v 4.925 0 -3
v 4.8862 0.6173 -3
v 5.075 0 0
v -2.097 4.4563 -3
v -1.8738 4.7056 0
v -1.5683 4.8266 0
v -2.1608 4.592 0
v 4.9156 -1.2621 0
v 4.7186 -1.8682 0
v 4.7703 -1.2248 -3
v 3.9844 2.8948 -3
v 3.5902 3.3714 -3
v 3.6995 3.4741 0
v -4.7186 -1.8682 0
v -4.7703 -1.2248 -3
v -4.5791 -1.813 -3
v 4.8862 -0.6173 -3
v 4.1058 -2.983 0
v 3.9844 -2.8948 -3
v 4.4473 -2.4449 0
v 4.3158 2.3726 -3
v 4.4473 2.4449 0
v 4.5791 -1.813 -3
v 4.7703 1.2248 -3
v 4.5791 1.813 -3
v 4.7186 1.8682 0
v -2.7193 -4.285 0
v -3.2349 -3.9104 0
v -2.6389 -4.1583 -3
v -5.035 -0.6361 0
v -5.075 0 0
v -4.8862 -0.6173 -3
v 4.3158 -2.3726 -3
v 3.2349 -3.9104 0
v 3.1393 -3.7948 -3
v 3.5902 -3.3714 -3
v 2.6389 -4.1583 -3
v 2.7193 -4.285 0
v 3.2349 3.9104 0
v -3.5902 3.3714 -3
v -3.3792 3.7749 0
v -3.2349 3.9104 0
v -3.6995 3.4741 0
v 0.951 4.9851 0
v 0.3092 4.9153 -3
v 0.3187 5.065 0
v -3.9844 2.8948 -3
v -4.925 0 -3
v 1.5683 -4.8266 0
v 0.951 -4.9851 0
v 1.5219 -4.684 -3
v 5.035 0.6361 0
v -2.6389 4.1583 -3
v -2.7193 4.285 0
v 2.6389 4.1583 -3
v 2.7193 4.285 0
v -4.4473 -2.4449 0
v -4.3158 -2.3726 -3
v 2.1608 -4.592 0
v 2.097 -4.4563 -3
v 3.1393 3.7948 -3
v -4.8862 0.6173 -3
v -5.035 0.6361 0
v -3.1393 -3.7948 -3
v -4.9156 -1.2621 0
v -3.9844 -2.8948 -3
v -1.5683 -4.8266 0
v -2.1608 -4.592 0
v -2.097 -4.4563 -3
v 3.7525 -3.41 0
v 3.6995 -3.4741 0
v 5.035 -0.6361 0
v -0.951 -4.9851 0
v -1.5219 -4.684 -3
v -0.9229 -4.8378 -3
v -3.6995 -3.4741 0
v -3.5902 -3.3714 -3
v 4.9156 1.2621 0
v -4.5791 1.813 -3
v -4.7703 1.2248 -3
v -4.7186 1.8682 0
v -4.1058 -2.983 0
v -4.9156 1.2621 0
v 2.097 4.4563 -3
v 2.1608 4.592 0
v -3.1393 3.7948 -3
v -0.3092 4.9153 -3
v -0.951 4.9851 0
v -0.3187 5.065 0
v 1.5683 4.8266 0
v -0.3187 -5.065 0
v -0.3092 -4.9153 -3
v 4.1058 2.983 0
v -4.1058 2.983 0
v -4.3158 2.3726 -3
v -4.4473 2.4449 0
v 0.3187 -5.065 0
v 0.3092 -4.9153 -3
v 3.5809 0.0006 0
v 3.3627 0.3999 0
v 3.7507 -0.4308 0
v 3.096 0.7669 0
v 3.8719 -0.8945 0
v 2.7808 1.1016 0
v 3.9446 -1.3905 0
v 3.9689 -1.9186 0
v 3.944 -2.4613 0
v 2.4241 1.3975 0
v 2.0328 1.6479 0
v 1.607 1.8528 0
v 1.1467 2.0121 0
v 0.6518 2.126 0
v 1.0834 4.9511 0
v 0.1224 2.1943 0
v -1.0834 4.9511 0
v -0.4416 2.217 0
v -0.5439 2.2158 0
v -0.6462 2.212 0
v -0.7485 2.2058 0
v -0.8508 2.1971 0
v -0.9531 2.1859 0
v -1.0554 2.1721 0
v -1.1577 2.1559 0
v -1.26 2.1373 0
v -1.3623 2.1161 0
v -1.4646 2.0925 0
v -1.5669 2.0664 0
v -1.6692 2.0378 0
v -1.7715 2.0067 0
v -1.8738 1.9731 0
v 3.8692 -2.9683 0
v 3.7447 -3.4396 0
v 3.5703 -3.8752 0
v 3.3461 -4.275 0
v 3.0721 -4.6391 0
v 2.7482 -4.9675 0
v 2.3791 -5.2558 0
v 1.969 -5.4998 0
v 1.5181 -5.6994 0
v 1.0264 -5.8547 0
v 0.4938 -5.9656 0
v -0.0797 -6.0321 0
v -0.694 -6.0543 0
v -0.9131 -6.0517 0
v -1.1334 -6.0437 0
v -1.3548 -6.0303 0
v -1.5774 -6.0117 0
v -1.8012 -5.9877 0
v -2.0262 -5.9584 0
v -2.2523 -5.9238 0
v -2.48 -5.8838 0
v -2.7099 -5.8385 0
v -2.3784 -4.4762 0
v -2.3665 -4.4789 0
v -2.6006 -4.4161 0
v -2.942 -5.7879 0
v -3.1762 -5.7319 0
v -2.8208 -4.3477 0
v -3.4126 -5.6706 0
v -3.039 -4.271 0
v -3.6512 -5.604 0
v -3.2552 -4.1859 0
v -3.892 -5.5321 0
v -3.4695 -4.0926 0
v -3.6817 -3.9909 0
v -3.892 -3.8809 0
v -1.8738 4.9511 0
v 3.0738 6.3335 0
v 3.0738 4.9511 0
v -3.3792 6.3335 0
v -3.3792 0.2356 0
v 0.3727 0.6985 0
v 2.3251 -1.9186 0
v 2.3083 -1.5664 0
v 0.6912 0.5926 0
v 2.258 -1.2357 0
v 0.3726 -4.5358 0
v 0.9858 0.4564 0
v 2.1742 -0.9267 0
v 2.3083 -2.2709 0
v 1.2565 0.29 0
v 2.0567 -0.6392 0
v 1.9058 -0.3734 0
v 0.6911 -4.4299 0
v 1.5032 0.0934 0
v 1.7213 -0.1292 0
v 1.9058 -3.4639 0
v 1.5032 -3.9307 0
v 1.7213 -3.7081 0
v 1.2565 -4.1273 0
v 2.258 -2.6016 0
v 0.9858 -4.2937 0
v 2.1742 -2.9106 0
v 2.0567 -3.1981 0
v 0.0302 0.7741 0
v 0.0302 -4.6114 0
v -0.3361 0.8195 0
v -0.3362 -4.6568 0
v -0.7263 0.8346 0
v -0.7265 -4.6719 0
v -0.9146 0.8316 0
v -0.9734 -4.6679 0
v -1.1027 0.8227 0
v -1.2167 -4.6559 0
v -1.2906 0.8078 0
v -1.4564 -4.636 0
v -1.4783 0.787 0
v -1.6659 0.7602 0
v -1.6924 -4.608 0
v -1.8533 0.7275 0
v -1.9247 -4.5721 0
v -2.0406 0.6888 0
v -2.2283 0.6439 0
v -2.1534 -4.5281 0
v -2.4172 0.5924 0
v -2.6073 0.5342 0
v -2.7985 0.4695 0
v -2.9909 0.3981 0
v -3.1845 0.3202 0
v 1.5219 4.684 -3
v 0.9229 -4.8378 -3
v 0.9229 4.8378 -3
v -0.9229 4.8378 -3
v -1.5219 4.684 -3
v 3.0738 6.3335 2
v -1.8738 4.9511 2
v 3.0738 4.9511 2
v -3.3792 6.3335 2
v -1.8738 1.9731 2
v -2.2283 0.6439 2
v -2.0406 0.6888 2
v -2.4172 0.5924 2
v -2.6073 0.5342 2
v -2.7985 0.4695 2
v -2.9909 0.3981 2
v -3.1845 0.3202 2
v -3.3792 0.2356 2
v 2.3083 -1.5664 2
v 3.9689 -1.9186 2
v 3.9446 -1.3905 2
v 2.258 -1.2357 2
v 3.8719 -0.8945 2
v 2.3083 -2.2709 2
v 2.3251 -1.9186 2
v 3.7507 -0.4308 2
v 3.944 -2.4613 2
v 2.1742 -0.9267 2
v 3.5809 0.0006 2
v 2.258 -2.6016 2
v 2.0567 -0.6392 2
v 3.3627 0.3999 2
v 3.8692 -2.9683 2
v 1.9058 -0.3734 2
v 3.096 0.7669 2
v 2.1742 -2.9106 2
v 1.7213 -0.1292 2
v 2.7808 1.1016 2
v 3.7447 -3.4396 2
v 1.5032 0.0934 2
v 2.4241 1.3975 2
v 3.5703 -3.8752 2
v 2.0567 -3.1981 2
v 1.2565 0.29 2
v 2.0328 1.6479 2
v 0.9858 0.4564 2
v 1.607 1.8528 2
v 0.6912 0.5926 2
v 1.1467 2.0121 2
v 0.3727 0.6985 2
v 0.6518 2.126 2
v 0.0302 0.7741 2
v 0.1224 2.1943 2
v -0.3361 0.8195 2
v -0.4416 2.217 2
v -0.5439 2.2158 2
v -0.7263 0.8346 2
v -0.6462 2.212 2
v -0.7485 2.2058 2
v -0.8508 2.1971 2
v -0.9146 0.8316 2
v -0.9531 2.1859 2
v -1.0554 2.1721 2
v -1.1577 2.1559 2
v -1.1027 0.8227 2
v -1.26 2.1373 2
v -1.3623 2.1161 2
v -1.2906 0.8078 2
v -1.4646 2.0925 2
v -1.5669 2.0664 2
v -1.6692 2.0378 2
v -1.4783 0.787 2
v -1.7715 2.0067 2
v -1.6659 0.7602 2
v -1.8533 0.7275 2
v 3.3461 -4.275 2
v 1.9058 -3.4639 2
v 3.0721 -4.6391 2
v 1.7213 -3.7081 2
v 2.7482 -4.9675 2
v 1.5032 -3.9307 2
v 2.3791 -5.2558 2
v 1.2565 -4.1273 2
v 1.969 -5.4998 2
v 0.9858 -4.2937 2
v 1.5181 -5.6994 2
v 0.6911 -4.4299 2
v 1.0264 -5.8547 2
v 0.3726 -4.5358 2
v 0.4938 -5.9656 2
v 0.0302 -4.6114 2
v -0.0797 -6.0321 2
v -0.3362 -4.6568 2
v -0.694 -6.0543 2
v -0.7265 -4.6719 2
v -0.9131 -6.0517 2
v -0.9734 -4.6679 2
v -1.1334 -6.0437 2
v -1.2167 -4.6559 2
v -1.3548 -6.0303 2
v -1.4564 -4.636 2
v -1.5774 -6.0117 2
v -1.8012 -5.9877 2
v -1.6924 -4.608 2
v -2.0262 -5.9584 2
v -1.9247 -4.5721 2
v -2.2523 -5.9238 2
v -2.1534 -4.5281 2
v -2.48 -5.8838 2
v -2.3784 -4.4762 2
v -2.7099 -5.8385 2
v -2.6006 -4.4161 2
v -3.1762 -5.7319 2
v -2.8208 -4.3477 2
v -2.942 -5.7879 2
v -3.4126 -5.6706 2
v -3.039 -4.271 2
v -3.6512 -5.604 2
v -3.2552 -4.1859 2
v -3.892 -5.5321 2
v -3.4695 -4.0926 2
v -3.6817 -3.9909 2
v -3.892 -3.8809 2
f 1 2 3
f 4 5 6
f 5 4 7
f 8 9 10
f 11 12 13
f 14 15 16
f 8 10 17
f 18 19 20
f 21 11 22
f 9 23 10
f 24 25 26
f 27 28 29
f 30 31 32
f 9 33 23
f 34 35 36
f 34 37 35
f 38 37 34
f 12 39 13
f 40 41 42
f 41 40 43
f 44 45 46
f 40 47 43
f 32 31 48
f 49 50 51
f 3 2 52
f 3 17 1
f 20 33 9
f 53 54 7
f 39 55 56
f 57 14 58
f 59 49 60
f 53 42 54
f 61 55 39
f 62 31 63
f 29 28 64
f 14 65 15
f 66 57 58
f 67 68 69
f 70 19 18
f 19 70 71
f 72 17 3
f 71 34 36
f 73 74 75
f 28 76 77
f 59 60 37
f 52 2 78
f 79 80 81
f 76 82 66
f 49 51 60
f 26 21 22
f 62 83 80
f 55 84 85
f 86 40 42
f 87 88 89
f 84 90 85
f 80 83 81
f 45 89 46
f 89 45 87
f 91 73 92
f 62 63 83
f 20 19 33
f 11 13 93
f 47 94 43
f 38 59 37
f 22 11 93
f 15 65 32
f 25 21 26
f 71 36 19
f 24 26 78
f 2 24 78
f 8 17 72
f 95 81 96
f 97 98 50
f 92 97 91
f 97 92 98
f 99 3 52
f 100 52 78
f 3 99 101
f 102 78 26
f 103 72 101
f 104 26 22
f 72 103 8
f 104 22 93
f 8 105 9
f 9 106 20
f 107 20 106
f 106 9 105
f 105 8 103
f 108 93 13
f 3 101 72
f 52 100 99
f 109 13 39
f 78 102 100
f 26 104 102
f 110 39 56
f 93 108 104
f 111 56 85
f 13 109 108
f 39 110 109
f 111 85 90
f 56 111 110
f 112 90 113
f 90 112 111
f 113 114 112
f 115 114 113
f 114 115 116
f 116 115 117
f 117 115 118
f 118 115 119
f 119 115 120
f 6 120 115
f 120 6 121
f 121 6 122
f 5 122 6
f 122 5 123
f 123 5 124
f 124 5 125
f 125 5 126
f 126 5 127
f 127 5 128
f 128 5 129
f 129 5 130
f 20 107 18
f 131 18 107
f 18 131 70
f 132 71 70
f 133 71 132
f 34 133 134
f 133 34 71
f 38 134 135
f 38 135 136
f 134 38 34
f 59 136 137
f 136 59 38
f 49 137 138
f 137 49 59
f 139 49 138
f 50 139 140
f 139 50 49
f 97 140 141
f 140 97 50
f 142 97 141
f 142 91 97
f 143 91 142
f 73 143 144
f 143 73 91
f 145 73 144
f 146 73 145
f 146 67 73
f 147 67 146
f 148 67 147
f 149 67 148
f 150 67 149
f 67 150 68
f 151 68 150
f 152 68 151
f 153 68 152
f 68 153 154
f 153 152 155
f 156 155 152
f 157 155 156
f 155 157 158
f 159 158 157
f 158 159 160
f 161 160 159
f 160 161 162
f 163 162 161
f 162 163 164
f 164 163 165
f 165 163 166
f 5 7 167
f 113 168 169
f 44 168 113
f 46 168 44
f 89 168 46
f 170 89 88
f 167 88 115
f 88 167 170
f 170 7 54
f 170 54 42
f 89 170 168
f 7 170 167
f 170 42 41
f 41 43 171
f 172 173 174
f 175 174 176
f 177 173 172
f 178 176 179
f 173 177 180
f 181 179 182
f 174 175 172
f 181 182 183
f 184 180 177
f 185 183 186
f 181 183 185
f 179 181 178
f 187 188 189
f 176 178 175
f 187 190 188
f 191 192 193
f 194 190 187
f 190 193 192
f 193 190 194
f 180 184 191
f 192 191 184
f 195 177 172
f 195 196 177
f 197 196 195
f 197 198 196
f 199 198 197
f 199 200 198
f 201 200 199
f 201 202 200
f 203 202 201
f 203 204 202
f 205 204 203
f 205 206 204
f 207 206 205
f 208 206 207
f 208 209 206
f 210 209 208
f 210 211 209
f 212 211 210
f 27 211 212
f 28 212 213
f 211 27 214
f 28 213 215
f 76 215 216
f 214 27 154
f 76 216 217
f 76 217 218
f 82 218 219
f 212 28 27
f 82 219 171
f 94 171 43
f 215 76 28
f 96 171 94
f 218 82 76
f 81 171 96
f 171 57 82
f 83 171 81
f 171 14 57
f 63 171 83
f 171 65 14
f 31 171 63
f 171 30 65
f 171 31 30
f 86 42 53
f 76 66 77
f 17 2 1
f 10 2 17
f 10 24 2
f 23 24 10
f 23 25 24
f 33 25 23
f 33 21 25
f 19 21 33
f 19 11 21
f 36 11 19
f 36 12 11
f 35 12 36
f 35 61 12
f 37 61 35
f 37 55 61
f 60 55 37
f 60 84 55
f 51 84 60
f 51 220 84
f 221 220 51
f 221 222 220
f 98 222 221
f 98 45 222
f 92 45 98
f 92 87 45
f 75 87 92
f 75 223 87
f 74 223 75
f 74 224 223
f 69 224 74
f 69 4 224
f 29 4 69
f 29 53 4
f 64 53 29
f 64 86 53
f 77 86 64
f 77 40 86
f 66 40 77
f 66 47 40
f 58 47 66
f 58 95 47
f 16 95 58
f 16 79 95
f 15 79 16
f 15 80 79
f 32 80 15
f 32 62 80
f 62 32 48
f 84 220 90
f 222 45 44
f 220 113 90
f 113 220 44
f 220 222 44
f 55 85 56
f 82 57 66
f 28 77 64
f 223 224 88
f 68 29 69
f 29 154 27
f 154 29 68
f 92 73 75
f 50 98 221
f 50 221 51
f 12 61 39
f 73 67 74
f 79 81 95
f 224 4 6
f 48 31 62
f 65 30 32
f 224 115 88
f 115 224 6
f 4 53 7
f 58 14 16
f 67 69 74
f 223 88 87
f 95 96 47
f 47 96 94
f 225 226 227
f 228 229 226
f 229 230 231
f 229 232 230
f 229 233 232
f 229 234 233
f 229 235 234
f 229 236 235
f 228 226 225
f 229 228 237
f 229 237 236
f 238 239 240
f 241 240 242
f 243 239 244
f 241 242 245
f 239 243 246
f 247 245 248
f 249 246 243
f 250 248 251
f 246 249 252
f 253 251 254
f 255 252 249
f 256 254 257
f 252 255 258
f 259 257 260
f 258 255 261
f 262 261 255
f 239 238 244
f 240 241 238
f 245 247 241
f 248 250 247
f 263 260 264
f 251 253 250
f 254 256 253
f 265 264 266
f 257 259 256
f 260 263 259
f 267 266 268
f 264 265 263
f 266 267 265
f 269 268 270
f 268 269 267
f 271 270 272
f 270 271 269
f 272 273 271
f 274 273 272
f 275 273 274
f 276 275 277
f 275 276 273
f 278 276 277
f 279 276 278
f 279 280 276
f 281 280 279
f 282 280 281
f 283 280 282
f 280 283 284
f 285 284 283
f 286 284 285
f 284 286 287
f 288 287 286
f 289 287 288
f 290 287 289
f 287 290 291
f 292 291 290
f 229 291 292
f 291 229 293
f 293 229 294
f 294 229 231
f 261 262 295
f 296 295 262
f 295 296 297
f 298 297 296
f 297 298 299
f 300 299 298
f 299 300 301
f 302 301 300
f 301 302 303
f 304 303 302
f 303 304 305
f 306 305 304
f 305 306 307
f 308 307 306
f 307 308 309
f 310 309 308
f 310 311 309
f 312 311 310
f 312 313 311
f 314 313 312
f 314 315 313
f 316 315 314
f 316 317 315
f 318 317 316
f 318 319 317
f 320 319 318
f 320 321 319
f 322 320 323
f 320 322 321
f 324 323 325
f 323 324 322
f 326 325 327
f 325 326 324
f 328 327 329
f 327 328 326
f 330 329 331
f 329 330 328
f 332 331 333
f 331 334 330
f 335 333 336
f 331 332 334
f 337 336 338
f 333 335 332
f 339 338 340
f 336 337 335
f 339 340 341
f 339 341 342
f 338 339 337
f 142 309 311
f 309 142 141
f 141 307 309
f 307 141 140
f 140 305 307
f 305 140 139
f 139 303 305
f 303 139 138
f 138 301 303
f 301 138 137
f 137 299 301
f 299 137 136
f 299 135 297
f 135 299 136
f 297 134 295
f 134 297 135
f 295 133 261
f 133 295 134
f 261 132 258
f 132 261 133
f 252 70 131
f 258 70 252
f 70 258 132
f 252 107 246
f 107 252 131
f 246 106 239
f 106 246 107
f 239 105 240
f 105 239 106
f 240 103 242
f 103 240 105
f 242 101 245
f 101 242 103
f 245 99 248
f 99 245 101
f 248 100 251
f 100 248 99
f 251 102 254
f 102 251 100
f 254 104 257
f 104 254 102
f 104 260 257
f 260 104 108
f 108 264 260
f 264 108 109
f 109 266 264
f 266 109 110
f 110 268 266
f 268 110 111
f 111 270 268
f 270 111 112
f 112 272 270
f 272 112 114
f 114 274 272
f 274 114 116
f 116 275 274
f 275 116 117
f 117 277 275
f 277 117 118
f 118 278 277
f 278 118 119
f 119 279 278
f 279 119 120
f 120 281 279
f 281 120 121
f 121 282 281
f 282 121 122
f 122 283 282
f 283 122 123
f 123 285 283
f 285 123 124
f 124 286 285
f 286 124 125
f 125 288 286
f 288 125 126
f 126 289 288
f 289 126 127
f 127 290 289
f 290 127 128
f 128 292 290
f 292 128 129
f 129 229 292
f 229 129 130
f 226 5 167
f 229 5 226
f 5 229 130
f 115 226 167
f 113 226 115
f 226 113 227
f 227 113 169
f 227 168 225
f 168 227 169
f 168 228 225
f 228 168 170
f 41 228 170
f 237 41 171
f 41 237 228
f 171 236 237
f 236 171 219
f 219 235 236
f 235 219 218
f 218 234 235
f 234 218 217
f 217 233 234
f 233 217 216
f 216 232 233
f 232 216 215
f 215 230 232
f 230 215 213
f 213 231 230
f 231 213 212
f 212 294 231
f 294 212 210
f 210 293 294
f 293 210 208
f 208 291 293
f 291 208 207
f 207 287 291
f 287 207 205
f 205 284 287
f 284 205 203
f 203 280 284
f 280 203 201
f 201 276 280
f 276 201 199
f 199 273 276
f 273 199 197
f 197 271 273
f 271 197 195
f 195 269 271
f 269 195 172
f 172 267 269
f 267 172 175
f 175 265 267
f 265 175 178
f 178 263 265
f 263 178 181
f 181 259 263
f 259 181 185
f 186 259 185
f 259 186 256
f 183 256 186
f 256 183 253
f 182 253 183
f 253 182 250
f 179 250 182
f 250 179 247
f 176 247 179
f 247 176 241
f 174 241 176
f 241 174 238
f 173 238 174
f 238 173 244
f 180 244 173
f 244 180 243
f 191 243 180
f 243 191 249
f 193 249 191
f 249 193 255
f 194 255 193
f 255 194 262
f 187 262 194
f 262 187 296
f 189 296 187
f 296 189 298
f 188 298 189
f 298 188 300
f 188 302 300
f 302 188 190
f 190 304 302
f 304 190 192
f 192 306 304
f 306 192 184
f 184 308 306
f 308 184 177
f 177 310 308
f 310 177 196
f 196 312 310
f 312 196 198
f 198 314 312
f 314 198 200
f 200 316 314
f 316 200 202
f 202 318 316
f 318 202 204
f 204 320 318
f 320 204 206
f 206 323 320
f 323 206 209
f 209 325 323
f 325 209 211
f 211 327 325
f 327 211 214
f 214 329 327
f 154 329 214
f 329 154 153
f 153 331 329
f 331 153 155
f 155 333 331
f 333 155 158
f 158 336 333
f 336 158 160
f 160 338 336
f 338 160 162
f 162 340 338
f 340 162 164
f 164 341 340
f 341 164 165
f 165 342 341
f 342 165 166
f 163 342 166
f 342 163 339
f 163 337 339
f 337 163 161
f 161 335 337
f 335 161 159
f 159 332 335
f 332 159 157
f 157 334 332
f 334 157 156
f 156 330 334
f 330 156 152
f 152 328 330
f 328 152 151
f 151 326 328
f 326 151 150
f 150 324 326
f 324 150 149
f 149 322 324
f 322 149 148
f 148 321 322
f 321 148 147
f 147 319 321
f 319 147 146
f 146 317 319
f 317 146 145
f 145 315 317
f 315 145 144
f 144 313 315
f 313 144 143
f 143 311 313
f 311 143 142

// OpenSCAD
$fn = 50;

difference() {
	union() {
		translate(v = [0, 0, -3.0]) {
			cylinder(h = 3, r1 = 4.925, r2 = 5.075);
		}
		linear_extrude(height = 2) {
			text(font = "Impact", halign = "center", size = 12, text = "5", valign = "center");
		}
	}
	union();
}
